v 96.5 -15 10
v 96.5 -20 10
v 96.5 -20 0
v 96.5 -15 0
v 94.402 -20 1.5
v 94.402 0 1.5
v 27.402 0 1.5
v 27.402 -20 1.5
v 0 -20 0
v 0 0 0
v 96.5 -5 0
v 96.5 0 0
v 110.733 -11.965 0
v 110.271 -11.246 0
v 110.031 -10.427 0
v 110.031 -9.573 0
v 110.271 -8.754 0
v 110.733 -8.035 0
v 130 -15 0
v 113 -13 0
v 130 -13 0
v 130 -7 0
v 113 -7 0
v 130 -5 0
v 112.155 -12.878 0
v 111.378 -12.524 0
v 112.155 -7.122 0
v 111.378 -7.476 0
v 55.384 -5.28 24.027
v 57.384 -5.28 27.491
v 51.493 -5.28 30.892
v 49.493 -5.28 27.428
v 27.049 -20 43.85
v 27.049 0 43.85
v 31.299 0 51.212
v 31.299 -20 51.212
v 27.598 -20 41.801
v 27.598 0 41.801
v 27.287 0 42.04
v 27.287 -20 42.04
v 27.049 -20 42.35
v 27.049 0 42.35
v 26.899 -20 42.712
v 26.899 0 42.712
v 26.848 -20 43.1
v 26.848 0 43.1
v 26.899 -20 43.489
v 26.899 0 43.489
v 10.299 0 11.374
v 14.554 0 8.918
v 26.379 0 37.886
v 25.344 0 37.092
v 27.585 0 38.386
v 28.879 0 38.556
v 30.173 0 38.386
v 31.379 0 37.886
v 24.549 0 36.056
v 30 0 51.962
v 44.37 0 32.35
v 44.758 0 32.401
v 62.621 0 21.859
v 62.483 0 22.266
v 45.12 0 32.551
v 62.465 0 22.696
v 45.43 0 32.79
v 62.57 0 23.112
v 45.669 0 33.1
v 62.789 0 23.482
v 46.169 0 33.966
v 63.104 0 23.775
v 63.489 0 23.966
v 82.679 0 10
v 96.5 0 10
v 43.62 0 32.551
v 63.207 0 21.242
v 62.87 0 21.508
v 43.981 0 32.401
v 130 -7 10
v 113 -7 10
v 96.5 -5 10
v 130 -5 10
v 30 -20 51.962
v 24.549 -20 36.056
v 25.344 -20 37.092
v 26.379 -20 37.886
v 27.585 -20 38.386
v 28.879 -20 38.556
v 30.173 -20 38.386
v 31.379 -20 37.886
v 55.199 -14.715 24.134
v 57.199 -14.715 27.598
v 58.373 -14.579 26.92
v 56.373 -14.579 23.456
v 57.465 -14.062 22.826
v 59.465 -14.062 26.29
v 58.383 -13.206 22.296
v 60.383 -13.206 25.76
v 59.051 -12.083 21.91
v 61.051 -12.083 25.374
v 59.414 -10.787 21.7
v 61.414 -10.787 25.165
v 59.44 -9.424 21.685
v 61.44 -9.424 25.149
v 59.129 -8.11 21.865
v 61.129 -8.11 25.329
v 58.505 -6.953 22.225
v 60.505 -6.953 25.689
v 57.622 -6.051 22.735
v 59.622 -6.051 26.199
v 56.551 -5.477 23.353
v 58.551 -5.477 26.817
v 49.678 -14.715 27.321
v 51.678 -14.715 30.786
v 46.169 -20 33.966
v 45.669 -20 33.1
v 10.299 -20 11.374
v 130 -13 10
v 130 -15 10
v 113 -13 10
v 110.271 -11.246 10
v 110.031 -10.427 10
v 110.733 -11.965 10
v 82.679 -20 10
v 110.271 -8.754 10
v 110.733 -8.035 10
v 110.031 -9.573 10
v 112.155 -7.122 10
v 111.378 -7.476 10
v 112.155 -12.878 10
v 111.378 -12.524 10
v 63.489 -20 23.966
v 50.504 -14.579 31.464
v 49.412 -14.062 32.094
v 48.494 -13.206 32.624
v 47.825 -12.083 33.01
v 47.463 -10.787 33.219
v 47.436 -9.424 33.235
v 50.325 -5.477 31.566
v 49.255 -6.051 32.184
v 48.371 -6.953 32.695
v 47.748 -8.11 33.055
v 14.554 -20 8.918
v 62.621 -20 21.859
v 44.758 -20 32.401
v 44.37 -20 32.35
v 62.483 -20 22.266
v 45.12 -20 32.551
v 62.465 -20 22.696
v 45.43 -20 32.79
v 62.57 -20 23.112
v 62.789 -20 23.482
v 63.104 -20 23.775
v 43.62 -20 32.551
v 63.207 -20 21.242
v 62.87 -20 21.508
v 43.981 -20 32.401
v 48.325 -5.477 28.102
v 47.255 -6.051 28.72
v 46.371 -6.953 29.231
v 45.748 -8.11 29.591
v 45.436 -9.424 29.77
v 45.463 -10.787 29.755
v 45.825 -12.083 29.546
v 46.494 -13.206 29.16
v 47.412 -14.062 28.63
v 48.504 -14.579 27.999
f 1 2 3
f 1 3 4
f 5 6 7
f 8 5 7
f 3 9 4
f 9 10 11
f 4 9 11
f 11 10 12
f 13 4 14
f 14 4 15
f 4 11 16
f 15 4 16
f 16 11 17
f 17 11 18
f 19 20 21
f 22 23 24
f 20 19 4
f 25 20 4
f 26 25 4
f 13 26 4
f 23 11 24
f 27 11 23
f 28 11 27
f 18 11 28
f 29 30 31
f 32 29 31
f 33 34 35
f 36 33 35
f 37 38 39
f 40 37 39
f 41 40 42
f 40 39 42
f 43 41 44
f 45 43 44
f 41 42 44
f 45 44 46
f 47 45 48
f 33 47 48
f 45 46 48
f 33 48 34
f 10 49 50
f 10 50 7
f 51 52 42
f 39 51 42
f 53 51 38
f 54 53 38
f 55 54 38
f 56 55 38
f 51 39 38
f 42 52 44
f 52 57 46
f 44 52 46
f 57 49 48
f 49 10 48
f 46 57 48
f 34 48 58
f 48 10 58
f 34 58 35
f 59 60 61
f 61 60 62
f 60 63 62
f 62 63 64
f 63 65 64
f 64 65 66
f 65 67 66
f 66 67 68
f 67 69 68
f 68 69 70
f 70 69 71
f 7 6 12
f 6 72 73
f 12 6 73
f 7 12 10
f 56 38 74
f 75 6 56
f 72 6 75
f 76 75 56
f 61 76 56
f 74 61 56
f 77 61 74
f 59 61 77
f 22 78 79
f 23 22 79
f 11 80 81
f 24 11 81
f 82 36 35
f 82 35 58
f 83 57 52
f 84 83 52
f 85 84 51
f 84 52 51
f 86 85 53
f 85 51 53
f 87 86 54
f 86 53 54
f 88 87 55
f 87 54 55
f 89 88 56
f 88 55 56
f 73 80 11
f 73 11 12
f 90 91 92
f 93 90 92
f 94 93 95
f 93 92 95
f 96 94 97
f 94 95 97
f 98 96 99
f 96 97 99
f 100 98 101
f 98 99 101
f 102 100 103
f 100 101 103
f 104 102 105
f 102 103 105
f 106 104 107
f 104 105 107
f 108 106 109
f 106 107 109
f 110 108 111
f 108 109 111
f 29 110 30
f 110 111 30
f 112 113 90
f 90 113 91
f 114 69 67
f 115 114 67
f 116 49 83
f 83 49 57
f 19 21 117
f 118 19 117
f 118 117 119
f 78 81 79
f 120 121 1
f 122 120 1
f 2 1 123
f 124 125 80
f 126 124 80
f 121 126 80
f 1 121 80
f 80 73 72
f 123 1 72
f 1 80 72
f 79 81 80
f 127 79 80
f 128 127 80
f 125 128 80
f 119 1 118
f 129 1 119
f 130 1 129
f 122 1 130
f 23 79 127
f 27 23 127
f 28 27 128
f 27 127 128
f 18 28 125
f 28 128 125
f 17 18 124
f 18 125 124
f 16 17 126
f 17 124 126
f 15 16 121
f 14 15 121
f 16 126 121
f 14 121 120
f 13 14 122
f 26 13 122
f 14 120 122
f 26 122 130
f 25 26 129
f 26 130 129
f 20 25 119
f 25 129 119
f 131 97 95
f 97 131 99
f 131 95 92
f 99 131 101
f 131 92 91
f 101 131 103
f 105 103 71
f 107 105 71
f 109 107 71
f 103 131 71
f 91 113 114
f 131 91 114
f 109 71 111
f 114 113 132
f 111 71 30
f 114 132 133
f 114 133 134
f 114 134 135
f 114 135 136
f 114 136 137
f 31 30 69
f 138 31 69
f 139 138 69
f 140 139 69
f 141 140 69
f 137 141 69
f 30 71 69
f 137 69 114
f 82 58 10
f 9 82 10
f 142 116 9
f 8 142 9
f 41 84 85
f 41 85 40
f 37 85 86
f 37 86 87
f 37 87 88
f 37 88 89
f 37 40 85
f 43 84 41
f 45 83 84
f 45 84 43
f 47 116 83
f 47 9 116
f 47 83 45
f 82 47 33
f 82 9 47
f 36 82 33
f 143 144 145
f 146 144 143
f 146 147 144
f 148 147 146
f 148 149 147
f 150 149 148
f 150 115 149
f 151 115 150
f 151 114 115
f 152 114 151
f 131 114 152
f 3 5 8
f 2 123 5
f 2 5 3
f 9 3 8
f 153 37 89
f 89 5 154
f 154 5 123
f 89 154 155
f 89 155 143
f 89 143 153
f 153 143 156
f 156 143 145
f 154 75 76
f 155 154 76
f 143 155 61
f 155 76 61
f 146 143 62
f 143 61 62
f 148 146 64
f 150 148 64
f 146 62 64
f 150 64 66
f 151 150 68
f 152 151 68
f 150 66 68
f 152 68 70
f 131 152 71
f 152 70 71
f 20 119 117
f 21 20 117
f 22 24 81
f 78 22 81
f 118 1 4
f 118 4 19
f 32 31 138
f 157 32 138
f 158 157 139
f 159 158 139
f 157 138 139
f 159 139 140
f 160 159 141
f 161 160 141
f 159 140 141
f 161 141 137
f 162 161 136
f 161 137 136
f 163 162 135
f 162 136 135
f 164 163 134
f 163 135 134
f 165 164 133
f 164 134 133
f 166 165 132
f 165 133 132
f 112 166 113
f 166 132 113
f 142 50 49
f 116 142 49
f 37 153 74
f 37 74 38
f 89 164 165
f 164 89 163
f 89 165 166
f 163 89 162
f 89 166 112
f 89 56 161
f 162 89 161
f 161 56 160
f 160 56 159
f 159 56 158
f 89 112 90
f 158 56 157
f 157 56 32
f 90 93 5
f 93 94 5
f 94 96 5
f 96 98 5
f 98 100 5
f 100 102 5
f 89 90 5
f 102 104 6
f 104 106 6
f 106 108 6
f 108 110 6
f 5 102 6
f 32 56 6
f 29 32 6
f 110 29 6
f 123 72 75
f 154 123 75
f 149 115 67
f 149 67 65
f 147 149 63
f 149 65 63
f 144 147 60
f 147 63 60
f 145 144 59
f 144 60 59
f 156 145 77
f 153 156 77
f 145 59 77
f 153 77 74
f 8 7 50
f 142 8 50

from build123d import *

# Parameters (mm, degrees)
F1_DEPTH = 20
F3_DEPTH = 4
F4_W     = 33.5
F4_H     = 5
F5_DEPTH = 10.001
F6_DEPTH = 10.001
F7_DEPTH = 10.001


with BuildPart() as f1:
    # F0 (on Front) → F1 (new body)
    with BuildSketch(Plane.XZ):
        with BuildLine():
            Line((30, 51.9615242271), (0, 0))
            Line((0, 0), (130, 0))
            Line((130, 0), (130, 10))
            Line((130, 10), (82.6794919243, 10))
            Line((82.6794919243, 10), (63.2073381993, 21.2422531948))
            ThreePointArc((63.2073381993, 21.2422531948), (62.4652978589, 22.6956144115), (63.4890923627, 23.9663336987))
            Line((63.4890923627, 23.9663336987), (46.168584287, 33.9663336987))
            Line((46.168584287, 33.9663336987), (45.668584287, 33.1003082949))
            ThreePointArc((45.668584287, 33.1003082949), (44.757774749, 32.4014195555), (43.6195461814, 32.5512701892))
            Line((43.6195461814, 32.5512701892), (27.5980762114, 41.8012701892))
            ThreePointArc((27.5980762114, 41.8012701892), (26.8991874719, 42.7120797272), (27.0490381057, 43.8503082949))
            Line((27.0490381057, 43.8503082949), (31.2990381057, 51.2115242271))
            Line((31.2990381057, 51.2115242271), (30, 51.9615242271))
        make_face()
        with BuildLine():
            ThreePointArc((24.5490381057, 36.0560796608), (27.5850698991, 38.3857087923), (31.3791651246, 37.8862066798))
            Line((31.3791651246, 37.8862066798), (94.4019237886, 1.5))
            Line((94.4019237886, 1.5), (27.4019237886, 1.5))
            Line((27.4019237886, 1.5), (14.5543888066, 8.9175277803))
            Line((14.5543888066, 8.9175277803), (10.2990381057, 11.374355653))
            Line((10.2990381057, 11.374355653), (24.5490381057, 36.0560796608))
        make_face(mode=Mode.SUBTRACT)
    extrude(amount=F1_DEPTH)

    # F2 (on face) → F3 (cut)
    with BuildSketch(Plane(origin=(26.25, 0, 45.4663336987), x_dir=(0.8660254038, 0, -0.5), z_dir=(0.5, 0, 0.8660254038))):
        with BuildLine():
            Line((35.949893862, -5.2802399732), (29.1481667175, -5.2802399732))
            ThreePointArc((29.1481667175, -5.2802399732), (24.4296125838, -10.1066845691), (29.3614813401, -14.7149370709))
            Line((29.3614813401, -14.7149370709), (35.7365792394, -14.7149370709))
            ThreePointArc((35.7365792394, -14.7149370709), (40.6684479957, -10.1066845691), (35.949893862, -5.2802399732))
        make_face()
    extrude(amount=-F3_DEPTH, mode=Mode.SUBTRACT)

    # F4 (on face) → F5 (cut, through all)
    with BuildSketch(Plane.XY.offset(10)):
        with Locations((113.25, -2.5)):
            Rectangle(F4_W, F4_H)
    extrude(amount=-F5_DEPTH, mode=Mode.SUBTRACT)

    # F4 (on face) → F6 (cut, through all)
    with BuildSketch(Plane.XY.offset(10)):
        with BuildLine():
            Line((130, -13), (130, -7))
            Line((130, -7), (113, -7))
            ThreePointArc((113, -7), (110, -10), (113, -13))
            Line((113, -13), (130, -13))
        make_face()
    extrude(amount=-F6_DEPTH, mode=Mode.SUBTRACT)

    # F4 (on face) → F7 (cut, through all)
    with BuildSketch(Plane.XY.offset(10)):
        with Locations((113.25, -17.5)):
            Rectangle(F4_W, F4_H)
    extrude(amount=-F7_DEPTH, mode=Mode.SUBTRACT)


solid = f1.part
